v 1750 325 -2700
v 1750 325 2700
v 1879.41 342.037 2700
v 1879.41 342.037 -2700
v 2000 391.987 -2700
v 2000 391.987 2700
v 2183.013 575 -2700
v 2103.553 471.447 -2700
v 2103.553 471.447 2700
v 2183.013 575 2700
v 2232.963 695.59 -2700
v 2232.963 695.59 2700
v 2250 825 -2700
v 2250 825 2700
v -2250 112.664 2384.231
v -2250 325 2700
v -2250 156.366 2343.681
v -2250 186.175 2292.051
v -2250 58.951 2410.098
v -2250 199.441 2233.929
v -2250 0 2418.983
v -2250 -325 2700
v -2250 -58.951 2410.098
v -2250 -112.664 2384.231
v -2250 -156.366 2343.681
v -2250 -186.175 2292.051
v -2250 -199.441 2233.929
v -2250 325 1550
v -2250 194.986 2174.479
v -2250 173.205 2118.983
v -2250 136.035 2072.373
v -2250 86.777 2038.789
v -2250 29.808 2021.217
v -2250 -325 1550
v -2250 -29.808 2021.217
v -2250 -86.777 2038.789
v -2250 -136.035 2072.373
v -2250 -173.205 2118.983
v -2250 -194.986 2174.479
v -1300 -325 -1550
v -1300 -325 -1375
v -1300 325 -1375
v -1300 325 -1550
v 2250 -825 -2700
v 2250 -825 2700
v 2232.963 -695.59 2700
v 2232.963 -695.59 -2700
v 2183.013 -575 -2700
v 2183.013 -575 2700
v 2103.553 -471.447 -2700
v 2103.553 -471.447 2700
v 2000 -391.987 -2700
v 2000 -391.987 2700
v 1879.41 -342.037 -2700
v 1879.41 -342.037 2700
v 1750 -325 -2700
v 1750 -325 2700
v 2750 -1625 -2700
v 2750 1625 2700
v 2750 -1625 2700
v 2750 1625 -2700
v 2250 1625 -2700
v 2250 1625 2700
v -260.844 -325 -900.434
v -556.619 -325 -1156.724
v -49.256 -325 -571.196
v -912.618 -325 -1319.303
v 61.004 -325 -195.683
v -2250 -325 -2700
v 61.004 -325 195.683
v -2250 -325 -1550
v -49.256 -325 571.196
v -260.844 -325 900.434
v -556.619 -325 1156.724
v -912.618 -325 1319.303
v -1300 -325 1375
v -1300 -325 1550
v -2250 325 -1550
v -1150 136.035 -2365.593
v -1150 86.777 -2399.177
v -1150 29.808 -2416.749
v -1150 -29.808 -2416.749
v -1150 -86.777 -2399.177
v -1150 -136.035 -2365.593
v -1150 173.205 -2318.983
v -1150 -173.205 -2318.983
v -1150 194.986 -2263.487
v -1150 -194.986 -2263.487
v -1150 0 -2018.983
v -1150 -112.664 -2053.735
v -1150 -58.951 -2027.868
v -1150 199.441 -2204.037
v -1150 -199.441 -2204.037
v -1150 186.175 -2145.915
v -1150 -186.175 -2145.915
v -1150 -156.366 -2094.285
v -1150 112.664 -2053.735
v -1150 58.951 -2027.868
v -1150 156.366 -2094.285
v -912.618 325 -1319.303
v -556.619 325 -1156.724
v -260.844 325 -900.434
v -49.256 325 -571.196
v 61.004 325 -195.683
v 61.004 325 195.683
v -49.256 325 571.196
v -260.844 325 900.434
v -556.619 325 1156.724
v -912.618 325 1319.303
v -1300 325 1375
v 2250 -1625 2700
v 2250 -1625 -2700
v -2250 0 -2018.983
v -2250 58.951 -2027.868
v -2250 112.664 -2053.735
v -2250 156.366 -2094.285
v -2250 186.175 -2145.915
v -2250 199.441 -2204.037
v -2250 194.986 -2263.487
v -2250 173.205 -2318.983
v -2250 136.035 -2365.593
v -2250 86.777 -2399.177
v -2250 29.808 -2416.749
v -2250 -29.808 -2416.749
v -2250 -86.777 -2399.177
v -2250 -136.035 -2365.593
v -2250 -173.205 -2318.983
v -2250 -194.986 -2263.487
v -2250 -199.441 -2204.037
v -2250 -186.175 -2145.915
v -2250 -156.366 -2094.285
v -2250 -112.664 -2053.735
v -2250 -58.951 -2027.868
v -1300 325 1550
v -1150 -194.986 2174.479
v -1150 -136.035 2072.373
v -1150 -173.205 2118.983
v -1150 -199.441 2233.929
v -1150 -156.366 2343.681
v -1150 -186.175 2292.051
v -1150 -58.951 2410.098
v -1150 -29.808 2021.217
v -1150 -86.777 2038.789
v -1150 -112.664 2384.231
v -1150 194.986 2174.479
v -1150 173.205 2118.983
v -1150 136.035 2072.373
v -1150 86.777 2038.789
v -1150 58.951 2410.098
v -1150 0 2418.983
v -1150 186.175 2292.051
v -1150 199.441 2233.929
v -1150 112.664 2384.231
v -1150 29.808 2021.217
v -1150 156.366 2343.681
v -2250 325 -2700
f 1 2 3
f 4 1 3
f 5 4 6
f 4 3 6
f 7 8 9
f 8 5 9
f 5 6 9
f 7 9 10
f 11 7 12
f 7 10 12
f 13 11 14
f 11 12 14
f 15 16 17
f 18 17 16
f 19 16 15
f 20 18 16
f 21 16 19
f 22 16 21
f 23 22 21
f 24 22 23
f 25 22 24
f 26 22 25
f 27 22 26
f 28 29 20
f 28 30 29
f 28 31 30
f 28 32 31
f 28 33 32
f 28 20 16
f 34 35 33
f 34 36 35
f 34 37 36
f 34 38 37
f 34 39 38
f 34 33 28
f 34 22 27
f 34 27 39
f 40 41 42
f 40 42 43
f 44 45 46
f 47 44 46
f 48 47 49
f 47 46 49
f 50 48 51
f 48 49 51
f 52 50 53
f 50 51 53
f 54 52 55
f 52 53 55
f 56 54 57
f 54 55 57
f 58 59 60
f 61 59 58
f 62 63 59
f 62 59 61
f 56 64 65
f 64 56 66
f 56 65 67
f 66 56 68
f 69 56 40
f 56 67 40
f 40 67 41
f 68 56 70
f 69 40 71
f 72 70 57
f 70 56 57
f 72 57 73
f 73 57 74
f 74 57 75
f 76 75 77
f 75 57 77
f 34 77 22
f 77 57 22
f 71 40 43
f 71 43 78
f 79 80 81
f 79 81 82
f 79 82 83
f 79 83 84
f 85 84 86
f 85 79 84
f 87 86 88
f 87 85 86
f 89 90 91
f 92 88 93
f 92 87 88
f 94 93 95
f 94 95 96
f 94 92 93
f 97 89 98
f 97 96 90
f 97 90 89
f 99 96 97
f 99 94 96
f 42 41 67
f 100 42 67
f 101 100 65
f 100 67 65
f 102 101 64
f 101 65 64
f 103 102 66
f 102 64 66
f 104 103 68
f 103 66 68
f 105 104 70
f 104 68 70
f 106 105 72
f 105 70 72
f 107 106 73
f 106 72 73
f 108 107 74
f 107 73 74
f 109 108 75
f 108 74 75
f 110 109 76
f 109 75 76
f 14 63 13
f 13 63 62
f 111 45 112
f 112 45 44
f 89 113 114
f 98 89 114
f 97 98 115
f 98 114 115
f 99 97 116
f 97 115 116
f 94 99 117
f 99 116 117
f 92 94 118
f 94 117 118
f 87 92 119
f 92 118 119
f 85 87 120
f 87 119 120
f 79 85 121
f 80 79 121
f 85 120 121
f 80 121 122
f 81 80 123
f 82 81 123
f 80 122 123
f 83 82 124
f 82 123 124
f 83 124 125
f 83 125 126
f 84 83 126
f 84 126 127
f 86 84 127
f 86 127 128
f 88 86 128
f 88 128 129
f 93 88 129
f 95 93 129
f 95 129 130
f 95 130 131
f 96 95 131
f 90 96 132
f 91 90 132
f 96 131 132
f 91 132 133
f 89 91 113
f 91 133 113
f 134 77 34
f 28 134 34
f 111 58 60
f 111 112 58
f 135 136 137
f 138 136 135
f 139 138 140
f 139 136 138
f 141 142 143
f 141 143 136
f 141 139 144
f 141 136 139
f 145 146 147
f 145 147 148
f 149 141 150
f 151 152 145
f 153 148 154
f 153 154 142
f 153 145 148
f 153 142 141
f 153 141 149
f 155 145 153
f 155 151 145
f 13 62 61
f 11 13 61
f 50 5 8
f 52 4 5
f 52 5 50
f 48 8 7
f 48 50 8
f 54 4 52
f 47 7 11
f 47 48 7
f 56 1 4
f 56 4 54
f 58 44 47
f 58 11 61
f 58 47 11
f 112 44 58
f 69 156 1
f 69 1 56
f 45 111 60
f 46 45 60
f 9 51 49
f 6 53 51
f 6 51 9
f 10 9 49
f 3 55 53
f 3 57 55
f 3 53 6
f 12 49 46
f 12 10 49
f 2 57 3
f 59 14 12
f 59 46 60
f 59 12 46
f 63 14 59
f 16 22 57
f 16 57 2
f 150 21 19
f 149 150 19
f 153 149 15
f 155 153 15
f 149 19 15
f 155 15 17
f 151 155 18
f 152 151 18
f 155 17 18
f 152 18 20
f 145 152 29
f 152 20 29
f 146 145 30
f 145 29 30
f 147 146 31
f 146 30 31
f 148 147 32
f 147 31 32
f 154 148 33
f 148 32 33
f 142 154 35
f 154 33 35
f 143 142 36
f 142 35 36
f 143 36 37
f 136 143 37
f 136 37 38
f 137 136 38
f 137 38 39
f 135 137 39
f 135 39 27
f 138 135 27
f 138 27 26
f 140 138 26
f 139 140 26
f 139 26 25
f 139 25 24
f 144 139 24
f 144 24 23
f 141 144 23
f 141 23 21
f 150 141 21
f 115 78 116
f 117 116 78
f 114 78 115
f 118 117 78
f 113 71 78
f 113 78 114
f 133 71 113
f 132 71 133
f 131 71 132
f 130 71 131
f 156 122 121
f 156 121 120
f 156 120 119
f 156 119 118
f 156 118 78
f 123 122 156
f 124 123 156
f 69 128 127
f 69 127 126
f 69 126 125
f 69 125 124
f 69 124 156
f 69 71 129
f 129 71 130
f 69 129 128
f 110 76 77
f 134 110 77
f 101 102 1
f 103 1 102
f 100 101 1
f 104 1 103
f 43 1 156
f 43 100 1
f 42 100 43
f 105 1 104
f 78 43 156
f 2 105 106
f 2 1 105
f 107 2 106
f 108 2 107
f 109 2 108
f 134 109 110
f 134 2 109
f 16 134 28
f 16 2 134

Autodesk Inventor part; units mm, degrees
ref_plane "YZ Plane" through (0, 0, 0) normal (1, 0, 0) x (0, 1, 0)
ref_plane "XZ Plane" through (0, 0, 0) normal (0, 1, 0) x (-1, 0, 0)
ref_plane "XY Plane" through (0, 0, 0) normal (0, 0, 1) x (1, 0, 0)
sketch "Sketch1" plane through (0, 0, 0) normal (0, 1, 0) x (-1, 0, 0)
  line L0 (-2250, 2700) -> (2250, 2700)
  line L1 (2250, -2700) -> (-2250, -2700)
  line L2 (-2250, -2700) -> (-2250, 2700)
  line L3 (1300, -1375) -> (1300, -1550)
  line L4 (1300, -1550) -> (2250, -1550)
  line L5 (1300, 1375) -> (1300, 1550)
  line L6 (1300, 1550) -> (2250, 1550)
  arc A0 (1300, 1375) -> (1300, -1375) centre (1300, 0) ccw
  line L7 (2250, 2700) -> (2250, 1550)
  line L8 (2250, -1550) -> (2250, -2700)
extrude "Extrusion1" add sketch "Sketch1" along normal mid plane 650
sketch "Sketch2" plane through (2250, -325, -2700) normal (1, 0, 0) x (0, 0, -1)
  line L0 (-5400, 1950) -> (0, 1950)
  line L1 (0, 1950) -> (0, -1300)
  line L2 (0, -1300) -> (-5400, -1300)
  line L3 (-5400, -1300) -> (-5400, 1950)
  line L4 (-5400, 1950) -> (0, -1300) construction
  line L5 (0, 1950) -> (-5400, -1300) construction
  point P0 (-2700, 325)
  dimension "d10" = 3250
extrude "Extrusion2" add sketch "Sketch2" along normal blind 500
fillet "Fillet1" radius 500 2 edges at (2250, 325, 0) (2250, -325, 0)
sketch "Sketch3" plane through (-2250, -325, 2700) normal (-1, 0, 0) x (0, 0, 1)
  line L0 (0, 0) -> (-5400, 0) projected
  line L1 (0, 0) -> (0, 325)
  line L2 (0, 1950) -> (0, -1300) projected
  line L3 (0, 325) -> (-481.017, 325)
  circle A0 centre (-481.017, 325) radius 200
  line L4 (-5400, 0) -> (-5400, 325)
  line L5 (-5400, -1300) -> (-5400, 1950) projected
  line L6 (-5400, 325) -> (-4918.983, 325)
  circle A1 centre (-4918.983, 325) radius 200
  point P0 (-2700, 325)
  dimension "d14" = 325
  dimension "d15" = 481.017
  dimension "d16" = 400
  dimension "d17" = 325
  dimension "d18" = 481.017
  dimension "d19" = 400
extrude "Extrusion3" cut sketch "Sketch3" against normal blind 1100
